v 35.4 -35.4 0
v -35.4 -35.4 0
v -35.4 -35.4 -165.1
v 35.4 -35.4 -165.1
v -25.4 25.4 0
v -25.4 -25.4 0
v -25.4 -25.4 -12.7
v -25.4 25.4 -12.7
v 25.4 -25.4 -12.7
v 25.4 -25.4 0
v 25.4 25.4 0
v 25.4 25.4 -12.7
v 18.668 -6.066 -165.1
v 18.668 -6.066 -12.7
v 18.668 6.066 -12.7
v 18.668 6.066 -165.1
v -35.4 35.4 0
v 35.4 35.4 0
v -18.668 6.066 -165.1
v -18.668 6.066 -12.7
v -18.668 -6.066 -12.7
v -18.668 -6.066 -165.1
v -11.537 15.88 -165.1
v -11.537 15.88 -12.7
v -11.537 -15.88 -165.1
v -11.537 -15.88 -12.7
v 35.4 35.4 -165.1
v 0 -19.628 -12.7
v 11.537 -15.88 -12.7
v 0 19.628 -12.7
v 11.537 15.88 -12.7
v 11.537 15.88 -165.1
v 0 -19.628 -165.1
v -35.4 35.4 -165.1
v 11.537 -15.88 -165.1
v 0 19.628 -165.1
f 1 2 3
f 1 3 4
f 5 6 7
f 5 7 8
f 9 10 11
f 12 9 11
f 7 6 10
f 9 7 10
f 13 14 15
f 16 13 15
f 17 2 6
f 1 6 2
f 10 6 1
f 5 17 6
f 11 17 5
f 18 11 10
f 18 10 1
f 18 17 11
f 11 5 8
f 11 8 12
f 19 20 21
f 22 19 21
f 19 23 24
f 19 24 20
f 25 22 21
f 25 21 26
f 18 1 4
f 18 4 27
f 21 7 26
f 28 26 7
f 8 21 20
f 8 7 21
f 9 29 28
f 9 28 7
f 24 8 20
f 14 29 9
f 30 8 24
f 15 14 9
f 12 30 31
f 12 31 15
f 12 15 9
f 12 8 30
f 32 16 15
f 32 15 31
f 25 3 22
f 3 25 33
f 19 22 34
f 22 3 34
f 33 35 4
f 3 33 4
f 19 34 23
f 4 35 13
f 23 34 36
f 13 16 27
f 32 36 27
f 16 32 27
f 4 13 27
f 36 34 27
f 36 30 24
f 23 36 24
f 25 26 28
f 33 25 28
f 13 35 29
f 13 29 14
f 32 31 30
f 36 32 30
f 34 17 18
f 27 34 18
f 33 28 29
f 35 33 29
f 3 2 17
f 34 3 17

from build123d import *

# Parameters (mm, degrees)
F0_W     = 70.8
F0_H     = 70.8
F0_W_2   = 50.8
F0_H_2   = 50.8
F1_DEPTH = 165.1
F2_DEPTH = 12.7
F4_DEPTH = 200.1


with BuildPart() as f1:
    # F0 (on Top) → F1 (new body)
    with BuildSketch(Plane.XY):
        Rectangle(F0_W, F0_H)
        Rectangle(F0_W_2, F0_H_2, mode=Mode.SUBTRACT)
        Rectangle(F0_W_2, F0_H_2)
    extrude(amount=-F1_DEPTH)

    # F0 (on Top) → F2 (cut)
    with BuildSketch(Plane.XY):
        Rectangle(F0_W_2, F0_H_2)
    extrude(amount=-F2_DEPTH, mode=Mode.SUBTRACT)

    # F3 (on face) → F4 (cut)
    with BuildSketch(Plane.XY):
        Polygon((18.667707, -6.065506), (18.667707, 6.065506), (11.537278, 15.8797), (0, 19.628389), (-11.537278, 15.8797), (-18.667707, 6.065506), (-18.667707, -6.065506), (-11.537278, -15.8797), (0, -19.628389), (11.537278, -15.8797), align=None)
    extrude(amount=-F4_DEPTH, mode=Mode.SUBTRACT)


solid = f1.part
